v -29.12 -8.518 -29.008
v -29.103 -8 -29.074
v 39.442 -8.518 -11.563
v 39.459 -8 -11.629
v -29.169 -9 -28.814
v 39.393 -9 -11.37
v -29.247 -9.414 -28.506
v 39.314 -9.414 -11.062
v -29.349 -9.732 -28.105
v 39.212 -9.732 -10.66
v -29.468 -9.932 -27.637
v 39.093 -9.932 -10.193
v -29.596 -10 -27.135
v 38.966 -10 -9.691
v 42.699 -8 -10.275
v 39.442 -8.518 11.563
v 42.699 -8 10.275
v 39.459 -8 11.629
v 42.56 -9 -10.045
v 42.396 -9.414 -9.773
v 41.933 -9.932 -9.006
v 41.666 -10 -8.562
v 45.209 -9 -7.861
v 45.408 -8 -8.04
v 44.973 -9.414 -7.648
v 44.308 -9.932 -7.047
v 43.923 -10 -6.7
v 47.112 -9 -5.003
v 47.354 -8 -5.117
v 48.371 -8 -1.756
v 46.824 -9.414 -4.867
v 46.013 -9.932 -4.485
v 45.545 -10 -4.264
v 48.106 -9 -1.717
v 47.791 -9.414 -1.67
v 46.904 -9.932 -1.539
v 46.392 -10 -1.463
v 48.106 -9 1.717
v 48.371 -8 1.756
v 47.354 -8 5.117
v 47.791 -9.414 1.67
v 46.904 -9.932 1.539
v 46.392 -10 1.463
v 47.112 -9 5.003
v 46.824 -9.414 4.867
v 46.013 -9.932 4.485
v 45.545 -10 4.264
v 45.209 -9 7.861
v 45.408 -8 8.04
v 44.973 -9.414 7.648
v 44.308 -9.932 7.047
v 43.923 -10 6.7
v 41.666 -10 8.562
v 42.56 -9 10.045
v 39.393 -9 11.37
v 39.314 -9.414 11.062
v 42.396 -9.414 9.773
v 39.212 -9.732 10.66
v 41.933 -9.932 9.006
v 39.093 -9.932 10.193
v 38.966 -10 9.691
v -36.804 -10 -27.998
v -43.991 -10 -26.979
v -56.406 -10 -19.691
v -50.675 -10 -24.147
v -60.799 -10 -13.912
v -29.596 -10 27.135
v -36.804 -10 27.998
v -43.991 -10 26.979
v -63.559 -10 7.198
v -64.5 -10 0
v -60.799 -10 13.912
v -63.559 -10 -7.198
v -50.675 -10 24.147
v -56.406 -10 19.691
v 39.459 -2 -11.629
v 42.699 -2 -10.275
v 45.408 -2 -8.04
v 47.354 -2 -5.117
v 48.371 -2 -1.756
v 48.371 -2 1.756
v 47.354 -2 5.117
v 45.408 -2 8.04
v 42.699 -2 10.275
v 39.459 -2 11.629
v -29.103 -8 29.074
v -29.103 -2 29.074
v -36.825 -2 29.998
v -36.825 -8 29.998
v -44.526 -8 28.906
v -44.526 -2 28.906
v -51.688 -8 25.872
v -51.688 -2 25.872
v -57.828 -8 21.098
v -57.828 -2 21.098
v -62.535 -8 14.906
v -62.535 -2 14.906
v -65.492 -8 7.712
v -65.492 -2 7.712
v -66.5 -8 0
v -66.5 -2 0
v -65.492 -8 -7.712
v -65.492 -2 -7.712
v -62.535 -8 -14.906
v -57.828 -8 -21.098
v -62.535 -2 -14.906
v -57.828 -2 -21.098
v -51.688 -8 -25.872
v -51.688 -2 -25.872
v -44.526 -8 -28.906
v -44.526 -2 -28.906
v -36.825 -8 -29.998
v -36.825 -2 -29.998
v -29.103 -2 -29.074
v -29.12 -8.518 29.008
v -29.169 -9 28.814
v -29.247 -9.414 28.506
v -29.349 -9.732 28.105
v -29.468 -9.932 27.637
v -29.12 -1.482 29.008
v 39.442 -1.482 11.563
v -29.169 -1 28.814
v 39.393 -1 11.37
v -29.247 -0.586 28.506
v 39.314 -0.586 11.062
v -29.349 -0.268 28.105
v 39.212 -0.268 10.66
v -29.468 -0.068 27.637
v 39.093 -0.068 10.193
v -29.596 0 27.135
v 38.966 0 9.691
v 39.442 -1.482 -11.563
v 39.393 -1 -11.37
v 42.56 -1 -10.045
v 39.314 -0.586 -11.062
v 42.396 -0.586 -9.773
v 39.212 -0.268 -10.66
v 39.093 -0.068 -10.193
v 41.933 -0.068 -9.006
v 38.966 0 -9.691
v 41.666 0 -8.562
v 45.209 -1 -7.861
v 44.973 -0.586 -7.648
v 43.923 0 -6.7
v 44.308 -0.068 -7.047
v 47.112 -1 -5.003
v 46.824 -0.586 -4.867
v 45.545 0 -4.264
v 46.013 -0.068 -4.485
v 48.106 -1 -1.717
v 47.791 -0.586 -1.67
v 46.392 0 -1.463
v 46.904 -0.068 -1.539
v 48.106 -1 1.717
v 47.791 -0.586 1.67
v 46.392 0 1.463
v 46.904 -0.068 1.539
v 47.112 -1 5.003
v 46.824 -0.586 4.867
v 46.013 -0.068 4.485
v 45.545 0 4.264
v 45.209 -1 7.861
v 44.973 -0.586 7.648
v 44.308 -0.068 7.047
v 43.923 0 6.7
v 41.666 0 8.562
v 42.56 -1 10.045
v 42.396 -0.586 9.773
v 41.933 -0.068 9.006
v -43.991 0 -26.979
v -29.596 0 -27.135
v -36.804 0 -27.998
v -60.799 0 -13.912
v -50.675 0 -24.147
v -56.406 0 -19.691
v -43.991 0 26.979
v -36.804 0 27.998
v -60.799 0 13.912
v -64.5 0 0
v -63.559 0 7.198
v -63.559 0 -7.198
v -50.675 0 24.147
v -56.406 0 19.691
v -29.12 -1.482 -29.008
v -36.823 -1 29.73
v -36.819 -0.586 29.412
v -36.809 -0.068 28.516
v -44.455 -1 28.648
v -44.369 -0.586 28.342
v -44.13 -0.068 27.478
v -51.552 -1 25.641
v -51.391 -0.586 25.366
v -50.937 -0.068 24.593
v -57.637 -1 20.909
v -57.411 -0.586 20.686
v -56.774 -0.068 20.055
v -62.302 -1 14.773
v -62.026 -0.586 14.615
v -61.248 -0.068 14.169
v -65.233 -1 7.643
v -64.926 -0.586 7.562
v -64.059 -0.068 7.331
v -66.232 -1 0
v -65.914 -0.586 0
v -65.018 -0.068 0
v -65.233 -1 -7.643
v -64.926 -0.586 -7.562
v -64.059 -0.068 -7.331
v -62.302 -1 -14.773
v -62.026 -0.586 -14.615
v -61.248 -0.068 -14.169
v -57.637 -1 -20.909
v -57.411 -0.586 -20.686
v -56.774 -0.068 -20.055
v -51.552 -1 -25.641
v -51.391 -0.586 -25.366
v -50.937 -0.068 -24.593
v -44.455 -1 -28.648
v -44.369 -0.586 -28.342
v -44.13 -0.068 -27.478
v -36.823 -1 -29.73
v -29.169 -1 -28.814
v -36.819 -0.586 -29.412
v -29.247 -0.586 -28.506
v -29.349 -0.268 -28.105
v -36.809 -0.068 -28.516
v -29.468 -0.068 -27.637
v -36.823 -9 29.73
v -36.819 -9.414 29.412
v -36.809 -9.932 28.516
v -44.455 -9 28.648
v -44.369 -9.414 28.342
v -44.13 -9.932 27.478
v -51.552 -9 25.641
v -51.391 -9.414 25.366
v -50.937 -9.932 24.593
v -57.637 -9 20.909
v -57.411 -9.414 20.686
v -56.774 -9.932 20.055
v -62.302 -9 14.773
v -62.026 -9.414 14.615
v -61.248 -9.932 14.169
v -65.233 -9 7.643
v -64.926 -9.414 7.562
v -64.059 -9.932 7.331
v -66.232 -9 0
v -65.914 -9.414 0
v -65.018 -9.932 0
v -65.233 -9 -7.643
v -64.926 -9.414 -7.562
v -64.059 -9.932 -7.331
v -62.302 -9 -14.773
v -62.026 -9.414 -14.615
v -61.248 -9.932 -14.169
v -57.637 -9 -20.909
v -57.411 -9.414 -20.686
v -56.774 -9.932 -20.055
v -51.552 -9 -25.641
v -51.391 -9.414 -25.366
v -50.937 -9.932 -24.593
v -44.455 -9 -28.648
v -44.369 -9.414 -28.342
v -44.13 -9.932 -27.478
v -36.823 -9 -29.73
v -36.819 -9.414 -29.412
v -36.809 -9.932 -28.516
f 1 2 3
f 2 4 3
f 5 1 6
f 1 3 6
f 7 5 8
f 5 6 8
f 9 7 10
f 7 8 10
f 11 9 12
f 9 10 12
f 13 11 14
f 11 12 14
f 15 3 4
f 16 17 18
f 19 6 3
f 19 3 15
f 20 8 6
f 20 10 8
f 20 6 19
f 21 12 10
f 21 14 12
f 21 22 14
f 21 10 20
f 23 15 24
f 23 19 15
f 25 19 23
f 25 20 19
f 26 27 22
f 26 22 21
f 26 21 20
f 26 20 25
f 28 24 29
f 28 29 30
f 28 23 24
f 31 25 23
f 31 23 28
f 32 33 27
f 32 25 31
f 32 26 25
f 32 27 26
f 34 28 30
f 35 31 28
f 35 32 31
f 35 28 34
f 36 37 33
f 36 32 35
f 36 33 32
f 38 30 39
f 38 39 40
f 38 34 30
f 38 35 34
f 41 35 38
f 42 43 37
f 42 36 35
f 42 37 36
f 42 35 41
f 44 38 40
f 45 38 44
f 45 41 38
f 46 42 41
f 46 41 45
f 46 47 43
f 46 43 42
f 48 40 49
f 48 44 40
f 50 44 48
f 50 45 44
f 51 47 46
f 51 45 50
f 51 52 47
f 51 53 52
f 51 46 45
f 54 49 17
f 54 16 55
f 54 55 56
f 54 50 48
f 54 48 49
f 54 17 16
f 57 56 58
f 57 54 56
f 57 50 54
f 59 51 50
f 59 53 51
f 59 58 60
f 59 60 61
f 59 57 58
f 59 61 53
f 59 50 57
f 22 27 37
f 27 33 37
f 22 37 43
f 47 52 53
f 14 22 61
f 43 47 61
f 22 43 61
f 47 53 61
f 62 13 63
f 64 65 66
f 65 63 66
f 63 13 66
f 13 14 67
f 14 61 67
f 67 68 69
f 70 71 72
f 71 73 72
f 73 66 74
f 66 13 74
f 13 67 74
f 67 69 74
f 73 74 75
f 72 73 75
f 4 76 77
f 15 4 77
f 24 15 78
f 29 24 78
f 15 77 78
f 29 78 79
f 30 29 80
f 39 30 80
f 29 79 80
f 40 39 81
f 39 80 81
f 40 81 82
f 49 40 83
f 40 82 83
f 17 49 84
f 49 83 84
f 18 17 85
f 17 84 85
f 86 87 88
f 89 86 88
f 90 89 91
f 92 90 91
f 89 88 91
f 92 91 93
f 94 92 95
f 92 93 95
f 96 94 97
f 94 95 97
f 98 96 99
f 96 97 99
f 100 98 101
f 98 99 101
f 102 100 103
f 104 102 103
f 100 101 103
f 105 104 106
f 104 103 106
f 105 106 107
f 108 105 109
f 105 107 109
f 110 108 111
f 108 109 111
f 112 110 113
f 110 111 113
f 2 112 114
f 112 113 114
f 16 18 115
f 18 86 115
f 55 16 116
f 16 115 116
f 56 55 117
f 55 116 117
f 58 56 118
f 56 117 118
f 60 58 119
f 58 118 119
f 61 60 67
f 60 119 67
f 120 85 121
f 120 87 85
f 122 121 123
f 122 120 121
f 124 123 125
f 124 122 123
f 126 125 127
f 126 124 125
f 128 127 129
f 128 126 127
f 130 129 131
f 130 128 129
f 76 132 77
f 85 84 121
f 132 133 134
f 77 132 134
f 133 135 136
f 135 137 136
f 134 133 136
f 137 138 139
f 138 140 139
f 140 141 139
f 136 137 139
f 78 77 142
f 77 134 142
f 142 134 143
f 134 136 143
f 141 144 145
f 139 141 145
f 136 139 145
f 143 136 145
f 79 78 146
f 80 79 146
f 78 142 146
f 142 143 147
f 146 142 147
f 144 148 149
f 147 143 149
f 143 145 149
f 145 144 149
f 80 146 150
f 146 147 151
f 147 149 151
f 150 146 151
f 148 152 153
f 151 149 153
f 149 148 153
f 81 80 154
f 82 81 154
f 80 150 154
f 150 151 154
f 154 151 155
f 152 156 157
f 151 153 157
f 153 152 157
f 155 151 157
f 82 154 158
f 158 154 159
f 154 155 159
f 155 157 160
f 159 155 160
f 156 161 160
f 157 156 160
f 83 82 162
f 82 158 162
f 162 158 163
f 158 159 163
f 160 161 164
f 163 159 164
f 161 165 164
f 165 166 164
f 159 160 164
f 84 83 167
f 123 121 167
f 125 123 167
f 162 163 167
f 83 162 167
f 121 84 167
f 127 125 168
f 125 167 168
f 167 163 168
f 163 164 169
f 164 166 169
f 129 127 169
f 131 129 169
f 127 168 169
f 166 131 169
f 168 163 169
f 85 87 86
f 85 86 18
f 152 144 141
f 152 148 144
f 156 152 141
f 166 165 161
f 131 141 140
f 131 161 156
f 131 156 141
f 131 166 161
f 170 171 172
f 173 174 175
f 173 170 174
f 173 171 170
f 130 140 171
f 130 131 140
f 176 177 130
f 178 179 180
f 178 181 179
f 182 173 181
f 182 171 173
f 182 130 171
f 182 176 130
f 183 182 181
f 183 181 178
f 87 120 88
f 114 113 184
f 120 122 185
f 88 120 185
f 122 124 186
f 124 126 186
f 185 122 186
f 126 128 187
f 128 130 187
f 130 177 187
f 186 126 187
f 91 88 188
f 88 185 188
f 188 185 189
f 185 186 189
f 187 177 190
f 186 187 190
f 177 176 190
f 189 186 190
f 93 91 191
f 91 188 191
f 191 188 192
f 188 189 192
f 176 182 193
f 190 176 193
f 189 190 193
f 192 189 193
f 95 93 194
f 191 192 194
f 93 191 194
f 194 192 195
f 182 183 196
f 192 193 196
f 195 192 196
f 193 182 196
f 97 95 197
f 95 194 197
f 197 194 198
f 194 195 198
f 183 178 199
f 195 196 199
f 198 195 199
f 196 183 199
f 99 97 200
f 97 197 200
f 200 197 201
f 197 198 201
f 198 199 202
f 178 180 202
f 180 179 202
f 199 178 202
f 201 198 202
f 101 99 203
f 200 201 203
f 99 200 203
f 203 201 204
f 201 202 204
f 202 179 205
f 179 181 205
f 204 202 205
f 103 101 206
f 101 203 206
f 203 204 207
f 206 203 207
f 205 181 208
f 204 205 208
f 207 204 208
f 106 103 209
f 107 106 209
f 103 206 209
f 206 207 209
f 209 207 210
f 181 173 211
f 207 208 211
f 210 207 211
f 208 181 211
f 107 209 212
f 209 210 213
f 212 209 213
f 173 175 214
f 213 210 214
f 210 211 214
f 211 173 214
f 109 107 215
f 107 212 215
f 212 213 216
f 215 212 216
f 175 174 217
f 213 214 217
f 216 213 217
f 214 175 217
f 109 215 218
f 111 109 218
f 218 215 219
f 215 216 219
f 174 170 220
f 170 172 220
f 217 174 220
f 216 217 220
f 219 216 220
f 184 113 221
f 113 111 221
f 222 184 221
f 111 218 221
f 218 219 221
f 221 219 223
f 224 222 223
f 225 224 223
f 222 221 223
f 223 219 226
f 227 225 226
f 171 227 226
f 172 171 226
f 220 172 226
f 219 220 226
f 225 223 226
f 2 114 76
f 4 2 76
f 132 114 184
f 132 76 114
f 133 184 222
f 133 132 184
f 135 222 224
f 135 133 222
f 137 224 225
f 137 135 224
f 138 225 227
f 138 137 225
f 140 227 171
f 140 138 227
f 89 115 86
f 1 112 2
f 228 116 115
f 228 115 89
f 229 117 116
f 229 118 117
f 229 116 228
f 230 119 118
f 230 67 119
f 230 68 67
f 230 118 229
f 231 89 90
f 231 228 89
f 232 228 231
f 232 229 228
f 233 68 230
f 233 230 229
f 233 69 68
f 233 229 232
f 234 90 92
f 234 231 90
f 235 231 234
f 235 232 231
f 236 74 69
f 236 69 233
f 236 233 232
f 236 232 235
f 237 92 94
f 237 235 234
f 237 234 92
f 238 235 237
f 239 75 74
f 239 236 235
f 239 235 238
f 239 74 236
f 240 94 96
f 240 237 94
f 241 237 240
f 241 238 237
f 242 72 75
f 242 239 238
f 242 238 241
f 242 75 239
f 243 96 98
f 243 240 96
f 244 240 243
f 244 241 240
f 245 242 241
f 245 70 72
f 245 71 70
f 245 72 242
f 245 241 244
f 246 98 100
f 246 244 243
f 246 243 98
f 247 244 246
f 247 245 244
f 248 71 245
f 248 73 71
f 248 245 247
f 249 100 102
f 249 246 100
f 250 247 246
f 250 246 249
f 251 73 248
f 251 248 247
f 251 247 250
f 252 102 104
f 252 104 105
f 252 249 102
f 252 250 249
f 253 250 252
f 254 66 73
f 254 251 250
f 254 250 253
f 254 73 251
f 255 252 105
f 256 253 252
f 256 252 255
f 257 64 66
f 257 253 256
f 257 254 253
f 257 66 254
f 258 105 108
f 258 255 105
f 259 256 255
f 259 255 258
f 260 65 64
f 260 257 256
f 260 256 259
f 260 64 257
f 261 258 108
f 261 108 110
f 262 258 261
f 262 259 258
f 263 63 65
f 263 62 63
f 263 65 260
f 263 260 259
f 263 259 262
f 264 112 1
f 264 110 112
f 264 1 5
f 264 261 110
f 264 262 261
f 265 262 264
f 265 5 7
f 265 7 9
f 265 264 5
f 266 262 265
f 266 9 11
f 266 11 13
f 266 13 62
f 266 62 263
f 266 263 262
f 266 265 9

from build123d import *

# Parameters (mm, degrees)
PAD_DEPTH = 10
FILLET_R  = 2


with BuildPart() as part:
    # Sketch → Pad (new body)
    with BuildSketch(Plane.XZ):
        with BuildLine():
            Line((-29.102787, 29.073721), (39.458904, 11.629483))
            ThreePointArc((39.458904, -11.629483), (48.5, 0), (39.458904, 11.629483))
            Line((-29.102787, -29.073721), (39.458904, -11.629483))
            ThreePointArc((-29.102787, 29.073721), (-66.5, 0), (-29.102787, -29.073721))
        make_face()
    extrude(amount=PAD_DEPTH)

    # Fillet
    fillet_edges = [part.edges().sort_by_distance(p)[0] for p in [
        (-66.5, -10, 0),
        (5.178059, -10, 20.351602),
        (48.5, -10, 0),
        (5.178059, -10, -20.351602),
        (-66.5, 0, 0),
        (5.178059, 0, 20.351602),
        (48.5, 0, 0),
        (5.178059, 0, -20.351602),
    ]]
    fillet(fillet_edges, radius=FILLET_R)


solid = part.part
